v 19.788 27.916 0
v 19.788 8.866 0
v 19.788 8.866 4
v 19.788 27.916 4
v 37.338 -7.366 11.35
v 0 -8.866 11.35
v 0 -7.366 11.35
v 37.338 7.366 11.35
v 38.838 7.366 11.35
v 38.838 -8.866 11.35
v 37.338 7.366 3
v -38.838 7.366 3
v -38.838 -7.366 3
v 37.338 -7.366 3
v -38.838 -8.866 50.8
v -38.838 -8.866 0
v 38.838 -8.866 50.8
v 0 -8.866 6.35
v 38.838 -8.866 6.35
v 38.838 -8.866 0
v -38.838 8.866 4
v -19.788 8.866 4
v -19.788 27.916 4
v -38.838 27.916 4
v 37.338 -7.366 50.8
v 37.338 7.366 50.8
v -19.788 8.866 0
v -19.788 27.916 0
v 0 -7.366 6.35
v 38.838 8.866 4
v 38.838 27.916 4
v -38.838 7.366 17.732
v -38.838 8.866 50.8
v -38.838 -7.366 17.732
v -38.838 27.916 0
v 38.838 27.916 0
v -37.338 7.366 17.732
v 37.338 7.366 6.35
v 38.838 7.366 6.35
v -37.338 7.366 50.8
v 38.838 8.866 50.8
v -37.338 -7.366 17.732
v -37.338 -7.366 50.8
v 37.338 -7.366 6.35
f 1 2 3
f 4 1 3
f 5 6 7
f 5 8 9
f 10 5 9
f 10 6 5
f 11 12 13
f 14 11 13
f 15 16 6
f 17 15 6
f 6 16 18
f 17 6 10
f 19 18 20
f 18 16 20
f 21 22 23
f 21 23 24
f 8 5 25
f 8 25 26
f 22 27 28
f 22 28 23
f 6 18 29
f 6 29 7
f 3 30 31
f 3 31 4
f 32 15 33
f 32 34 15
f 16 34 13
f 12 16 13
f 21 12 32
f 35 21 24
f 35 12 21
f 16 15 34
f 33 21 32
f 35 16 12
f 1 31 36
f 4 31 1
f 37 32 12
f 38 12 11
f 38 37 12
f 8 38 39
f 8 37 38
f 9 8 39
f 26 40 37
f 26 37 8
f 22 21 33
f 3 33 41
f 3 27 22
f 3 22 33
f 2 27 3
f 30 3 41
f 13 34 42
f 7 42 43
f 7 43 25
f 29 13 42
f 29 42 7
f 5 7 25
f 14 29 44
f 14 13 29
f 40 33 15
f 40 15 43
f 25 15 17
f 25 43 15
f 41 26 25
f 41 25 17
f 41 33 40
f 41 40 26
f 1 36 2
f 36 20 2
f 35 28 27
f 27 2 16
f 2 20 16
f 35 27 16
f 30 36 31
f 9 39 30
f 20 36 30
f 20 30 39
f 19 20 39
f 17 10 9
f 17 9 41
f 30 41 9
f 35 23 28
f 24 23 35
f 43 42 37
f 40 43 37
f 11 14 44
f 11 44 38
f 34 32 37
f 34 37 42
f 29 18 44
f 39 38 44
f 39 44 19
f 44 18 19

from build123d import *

# Parameters (mm, degrees)
F0_W     = 77.676
F0_H     = 17.732
F0_W_2   = 74.676
F0_H_2   = 14.732
F1_DEPTH = 50.8
F2_DEPTH = 3
F3_W     = 19.05
F3_H     = 4
F4_DEPTH = 19.05
F5_W     = 14.732
F5_H     = 14.732
F6_DEPTH = 5
F7_W     = 38.838
F7_H     = 5
F8_DEPTH = 16.232


with BuildPart() as f1:
    # F0 (on Top) → F1 (new body)
    with BuildSketch(Plane.XY):
        Rectangle(F0_W, F0_H)
        Rectangle(F0_W_2, F0_H_2, mode=Mode.SUBTRACT)
    extrude(amount=F1_DEPTH)

    # F0 (on Top) → F2 (join)
    with BuildSketch(Plane.XY):
        Rectangle(F0_W_2, F0_H_2)
    extrude(amount=F2_DEPTH)

    # F3 (on face) → F4 (join)
    with BuildSketch(Plane(origin=(0, 8.866, 0), x_dir=(-1, 0, 0), z_dir=(0, 1, 0))):
        with Locations((-29.313, 2)):
            Rectangle(F3_W, F3_H)
        with Locations((29.313, 2)):
            Rectangle(F3_W, F3_H)
    extrude(amount=F4_DEPTH)

    # F5 (on face) → F6 (cut)
    with BuildSketch(Plane(origin=(-38.838, 0, 0), x_dir=(0, -1, 0), z_dir=(-1, 0, 0))):
        with Locations((0, 10.366)):
            Rectangle(F5_W, F5_H)
    extrude(amount=-F6_DEPTH, mode=Mode.SUBTRACT)

    # F7 (on face) → F8 (cut)
    with BuildSketch(Plane.XZ.offset(8.866)):
        with Locations((19.419, 8.85)):
            Rectangle(F7_W, F7_H)
    extrude(amount=-F8_DEPTH, mode=Mode.SUBTRACT)


solid = f1.part
